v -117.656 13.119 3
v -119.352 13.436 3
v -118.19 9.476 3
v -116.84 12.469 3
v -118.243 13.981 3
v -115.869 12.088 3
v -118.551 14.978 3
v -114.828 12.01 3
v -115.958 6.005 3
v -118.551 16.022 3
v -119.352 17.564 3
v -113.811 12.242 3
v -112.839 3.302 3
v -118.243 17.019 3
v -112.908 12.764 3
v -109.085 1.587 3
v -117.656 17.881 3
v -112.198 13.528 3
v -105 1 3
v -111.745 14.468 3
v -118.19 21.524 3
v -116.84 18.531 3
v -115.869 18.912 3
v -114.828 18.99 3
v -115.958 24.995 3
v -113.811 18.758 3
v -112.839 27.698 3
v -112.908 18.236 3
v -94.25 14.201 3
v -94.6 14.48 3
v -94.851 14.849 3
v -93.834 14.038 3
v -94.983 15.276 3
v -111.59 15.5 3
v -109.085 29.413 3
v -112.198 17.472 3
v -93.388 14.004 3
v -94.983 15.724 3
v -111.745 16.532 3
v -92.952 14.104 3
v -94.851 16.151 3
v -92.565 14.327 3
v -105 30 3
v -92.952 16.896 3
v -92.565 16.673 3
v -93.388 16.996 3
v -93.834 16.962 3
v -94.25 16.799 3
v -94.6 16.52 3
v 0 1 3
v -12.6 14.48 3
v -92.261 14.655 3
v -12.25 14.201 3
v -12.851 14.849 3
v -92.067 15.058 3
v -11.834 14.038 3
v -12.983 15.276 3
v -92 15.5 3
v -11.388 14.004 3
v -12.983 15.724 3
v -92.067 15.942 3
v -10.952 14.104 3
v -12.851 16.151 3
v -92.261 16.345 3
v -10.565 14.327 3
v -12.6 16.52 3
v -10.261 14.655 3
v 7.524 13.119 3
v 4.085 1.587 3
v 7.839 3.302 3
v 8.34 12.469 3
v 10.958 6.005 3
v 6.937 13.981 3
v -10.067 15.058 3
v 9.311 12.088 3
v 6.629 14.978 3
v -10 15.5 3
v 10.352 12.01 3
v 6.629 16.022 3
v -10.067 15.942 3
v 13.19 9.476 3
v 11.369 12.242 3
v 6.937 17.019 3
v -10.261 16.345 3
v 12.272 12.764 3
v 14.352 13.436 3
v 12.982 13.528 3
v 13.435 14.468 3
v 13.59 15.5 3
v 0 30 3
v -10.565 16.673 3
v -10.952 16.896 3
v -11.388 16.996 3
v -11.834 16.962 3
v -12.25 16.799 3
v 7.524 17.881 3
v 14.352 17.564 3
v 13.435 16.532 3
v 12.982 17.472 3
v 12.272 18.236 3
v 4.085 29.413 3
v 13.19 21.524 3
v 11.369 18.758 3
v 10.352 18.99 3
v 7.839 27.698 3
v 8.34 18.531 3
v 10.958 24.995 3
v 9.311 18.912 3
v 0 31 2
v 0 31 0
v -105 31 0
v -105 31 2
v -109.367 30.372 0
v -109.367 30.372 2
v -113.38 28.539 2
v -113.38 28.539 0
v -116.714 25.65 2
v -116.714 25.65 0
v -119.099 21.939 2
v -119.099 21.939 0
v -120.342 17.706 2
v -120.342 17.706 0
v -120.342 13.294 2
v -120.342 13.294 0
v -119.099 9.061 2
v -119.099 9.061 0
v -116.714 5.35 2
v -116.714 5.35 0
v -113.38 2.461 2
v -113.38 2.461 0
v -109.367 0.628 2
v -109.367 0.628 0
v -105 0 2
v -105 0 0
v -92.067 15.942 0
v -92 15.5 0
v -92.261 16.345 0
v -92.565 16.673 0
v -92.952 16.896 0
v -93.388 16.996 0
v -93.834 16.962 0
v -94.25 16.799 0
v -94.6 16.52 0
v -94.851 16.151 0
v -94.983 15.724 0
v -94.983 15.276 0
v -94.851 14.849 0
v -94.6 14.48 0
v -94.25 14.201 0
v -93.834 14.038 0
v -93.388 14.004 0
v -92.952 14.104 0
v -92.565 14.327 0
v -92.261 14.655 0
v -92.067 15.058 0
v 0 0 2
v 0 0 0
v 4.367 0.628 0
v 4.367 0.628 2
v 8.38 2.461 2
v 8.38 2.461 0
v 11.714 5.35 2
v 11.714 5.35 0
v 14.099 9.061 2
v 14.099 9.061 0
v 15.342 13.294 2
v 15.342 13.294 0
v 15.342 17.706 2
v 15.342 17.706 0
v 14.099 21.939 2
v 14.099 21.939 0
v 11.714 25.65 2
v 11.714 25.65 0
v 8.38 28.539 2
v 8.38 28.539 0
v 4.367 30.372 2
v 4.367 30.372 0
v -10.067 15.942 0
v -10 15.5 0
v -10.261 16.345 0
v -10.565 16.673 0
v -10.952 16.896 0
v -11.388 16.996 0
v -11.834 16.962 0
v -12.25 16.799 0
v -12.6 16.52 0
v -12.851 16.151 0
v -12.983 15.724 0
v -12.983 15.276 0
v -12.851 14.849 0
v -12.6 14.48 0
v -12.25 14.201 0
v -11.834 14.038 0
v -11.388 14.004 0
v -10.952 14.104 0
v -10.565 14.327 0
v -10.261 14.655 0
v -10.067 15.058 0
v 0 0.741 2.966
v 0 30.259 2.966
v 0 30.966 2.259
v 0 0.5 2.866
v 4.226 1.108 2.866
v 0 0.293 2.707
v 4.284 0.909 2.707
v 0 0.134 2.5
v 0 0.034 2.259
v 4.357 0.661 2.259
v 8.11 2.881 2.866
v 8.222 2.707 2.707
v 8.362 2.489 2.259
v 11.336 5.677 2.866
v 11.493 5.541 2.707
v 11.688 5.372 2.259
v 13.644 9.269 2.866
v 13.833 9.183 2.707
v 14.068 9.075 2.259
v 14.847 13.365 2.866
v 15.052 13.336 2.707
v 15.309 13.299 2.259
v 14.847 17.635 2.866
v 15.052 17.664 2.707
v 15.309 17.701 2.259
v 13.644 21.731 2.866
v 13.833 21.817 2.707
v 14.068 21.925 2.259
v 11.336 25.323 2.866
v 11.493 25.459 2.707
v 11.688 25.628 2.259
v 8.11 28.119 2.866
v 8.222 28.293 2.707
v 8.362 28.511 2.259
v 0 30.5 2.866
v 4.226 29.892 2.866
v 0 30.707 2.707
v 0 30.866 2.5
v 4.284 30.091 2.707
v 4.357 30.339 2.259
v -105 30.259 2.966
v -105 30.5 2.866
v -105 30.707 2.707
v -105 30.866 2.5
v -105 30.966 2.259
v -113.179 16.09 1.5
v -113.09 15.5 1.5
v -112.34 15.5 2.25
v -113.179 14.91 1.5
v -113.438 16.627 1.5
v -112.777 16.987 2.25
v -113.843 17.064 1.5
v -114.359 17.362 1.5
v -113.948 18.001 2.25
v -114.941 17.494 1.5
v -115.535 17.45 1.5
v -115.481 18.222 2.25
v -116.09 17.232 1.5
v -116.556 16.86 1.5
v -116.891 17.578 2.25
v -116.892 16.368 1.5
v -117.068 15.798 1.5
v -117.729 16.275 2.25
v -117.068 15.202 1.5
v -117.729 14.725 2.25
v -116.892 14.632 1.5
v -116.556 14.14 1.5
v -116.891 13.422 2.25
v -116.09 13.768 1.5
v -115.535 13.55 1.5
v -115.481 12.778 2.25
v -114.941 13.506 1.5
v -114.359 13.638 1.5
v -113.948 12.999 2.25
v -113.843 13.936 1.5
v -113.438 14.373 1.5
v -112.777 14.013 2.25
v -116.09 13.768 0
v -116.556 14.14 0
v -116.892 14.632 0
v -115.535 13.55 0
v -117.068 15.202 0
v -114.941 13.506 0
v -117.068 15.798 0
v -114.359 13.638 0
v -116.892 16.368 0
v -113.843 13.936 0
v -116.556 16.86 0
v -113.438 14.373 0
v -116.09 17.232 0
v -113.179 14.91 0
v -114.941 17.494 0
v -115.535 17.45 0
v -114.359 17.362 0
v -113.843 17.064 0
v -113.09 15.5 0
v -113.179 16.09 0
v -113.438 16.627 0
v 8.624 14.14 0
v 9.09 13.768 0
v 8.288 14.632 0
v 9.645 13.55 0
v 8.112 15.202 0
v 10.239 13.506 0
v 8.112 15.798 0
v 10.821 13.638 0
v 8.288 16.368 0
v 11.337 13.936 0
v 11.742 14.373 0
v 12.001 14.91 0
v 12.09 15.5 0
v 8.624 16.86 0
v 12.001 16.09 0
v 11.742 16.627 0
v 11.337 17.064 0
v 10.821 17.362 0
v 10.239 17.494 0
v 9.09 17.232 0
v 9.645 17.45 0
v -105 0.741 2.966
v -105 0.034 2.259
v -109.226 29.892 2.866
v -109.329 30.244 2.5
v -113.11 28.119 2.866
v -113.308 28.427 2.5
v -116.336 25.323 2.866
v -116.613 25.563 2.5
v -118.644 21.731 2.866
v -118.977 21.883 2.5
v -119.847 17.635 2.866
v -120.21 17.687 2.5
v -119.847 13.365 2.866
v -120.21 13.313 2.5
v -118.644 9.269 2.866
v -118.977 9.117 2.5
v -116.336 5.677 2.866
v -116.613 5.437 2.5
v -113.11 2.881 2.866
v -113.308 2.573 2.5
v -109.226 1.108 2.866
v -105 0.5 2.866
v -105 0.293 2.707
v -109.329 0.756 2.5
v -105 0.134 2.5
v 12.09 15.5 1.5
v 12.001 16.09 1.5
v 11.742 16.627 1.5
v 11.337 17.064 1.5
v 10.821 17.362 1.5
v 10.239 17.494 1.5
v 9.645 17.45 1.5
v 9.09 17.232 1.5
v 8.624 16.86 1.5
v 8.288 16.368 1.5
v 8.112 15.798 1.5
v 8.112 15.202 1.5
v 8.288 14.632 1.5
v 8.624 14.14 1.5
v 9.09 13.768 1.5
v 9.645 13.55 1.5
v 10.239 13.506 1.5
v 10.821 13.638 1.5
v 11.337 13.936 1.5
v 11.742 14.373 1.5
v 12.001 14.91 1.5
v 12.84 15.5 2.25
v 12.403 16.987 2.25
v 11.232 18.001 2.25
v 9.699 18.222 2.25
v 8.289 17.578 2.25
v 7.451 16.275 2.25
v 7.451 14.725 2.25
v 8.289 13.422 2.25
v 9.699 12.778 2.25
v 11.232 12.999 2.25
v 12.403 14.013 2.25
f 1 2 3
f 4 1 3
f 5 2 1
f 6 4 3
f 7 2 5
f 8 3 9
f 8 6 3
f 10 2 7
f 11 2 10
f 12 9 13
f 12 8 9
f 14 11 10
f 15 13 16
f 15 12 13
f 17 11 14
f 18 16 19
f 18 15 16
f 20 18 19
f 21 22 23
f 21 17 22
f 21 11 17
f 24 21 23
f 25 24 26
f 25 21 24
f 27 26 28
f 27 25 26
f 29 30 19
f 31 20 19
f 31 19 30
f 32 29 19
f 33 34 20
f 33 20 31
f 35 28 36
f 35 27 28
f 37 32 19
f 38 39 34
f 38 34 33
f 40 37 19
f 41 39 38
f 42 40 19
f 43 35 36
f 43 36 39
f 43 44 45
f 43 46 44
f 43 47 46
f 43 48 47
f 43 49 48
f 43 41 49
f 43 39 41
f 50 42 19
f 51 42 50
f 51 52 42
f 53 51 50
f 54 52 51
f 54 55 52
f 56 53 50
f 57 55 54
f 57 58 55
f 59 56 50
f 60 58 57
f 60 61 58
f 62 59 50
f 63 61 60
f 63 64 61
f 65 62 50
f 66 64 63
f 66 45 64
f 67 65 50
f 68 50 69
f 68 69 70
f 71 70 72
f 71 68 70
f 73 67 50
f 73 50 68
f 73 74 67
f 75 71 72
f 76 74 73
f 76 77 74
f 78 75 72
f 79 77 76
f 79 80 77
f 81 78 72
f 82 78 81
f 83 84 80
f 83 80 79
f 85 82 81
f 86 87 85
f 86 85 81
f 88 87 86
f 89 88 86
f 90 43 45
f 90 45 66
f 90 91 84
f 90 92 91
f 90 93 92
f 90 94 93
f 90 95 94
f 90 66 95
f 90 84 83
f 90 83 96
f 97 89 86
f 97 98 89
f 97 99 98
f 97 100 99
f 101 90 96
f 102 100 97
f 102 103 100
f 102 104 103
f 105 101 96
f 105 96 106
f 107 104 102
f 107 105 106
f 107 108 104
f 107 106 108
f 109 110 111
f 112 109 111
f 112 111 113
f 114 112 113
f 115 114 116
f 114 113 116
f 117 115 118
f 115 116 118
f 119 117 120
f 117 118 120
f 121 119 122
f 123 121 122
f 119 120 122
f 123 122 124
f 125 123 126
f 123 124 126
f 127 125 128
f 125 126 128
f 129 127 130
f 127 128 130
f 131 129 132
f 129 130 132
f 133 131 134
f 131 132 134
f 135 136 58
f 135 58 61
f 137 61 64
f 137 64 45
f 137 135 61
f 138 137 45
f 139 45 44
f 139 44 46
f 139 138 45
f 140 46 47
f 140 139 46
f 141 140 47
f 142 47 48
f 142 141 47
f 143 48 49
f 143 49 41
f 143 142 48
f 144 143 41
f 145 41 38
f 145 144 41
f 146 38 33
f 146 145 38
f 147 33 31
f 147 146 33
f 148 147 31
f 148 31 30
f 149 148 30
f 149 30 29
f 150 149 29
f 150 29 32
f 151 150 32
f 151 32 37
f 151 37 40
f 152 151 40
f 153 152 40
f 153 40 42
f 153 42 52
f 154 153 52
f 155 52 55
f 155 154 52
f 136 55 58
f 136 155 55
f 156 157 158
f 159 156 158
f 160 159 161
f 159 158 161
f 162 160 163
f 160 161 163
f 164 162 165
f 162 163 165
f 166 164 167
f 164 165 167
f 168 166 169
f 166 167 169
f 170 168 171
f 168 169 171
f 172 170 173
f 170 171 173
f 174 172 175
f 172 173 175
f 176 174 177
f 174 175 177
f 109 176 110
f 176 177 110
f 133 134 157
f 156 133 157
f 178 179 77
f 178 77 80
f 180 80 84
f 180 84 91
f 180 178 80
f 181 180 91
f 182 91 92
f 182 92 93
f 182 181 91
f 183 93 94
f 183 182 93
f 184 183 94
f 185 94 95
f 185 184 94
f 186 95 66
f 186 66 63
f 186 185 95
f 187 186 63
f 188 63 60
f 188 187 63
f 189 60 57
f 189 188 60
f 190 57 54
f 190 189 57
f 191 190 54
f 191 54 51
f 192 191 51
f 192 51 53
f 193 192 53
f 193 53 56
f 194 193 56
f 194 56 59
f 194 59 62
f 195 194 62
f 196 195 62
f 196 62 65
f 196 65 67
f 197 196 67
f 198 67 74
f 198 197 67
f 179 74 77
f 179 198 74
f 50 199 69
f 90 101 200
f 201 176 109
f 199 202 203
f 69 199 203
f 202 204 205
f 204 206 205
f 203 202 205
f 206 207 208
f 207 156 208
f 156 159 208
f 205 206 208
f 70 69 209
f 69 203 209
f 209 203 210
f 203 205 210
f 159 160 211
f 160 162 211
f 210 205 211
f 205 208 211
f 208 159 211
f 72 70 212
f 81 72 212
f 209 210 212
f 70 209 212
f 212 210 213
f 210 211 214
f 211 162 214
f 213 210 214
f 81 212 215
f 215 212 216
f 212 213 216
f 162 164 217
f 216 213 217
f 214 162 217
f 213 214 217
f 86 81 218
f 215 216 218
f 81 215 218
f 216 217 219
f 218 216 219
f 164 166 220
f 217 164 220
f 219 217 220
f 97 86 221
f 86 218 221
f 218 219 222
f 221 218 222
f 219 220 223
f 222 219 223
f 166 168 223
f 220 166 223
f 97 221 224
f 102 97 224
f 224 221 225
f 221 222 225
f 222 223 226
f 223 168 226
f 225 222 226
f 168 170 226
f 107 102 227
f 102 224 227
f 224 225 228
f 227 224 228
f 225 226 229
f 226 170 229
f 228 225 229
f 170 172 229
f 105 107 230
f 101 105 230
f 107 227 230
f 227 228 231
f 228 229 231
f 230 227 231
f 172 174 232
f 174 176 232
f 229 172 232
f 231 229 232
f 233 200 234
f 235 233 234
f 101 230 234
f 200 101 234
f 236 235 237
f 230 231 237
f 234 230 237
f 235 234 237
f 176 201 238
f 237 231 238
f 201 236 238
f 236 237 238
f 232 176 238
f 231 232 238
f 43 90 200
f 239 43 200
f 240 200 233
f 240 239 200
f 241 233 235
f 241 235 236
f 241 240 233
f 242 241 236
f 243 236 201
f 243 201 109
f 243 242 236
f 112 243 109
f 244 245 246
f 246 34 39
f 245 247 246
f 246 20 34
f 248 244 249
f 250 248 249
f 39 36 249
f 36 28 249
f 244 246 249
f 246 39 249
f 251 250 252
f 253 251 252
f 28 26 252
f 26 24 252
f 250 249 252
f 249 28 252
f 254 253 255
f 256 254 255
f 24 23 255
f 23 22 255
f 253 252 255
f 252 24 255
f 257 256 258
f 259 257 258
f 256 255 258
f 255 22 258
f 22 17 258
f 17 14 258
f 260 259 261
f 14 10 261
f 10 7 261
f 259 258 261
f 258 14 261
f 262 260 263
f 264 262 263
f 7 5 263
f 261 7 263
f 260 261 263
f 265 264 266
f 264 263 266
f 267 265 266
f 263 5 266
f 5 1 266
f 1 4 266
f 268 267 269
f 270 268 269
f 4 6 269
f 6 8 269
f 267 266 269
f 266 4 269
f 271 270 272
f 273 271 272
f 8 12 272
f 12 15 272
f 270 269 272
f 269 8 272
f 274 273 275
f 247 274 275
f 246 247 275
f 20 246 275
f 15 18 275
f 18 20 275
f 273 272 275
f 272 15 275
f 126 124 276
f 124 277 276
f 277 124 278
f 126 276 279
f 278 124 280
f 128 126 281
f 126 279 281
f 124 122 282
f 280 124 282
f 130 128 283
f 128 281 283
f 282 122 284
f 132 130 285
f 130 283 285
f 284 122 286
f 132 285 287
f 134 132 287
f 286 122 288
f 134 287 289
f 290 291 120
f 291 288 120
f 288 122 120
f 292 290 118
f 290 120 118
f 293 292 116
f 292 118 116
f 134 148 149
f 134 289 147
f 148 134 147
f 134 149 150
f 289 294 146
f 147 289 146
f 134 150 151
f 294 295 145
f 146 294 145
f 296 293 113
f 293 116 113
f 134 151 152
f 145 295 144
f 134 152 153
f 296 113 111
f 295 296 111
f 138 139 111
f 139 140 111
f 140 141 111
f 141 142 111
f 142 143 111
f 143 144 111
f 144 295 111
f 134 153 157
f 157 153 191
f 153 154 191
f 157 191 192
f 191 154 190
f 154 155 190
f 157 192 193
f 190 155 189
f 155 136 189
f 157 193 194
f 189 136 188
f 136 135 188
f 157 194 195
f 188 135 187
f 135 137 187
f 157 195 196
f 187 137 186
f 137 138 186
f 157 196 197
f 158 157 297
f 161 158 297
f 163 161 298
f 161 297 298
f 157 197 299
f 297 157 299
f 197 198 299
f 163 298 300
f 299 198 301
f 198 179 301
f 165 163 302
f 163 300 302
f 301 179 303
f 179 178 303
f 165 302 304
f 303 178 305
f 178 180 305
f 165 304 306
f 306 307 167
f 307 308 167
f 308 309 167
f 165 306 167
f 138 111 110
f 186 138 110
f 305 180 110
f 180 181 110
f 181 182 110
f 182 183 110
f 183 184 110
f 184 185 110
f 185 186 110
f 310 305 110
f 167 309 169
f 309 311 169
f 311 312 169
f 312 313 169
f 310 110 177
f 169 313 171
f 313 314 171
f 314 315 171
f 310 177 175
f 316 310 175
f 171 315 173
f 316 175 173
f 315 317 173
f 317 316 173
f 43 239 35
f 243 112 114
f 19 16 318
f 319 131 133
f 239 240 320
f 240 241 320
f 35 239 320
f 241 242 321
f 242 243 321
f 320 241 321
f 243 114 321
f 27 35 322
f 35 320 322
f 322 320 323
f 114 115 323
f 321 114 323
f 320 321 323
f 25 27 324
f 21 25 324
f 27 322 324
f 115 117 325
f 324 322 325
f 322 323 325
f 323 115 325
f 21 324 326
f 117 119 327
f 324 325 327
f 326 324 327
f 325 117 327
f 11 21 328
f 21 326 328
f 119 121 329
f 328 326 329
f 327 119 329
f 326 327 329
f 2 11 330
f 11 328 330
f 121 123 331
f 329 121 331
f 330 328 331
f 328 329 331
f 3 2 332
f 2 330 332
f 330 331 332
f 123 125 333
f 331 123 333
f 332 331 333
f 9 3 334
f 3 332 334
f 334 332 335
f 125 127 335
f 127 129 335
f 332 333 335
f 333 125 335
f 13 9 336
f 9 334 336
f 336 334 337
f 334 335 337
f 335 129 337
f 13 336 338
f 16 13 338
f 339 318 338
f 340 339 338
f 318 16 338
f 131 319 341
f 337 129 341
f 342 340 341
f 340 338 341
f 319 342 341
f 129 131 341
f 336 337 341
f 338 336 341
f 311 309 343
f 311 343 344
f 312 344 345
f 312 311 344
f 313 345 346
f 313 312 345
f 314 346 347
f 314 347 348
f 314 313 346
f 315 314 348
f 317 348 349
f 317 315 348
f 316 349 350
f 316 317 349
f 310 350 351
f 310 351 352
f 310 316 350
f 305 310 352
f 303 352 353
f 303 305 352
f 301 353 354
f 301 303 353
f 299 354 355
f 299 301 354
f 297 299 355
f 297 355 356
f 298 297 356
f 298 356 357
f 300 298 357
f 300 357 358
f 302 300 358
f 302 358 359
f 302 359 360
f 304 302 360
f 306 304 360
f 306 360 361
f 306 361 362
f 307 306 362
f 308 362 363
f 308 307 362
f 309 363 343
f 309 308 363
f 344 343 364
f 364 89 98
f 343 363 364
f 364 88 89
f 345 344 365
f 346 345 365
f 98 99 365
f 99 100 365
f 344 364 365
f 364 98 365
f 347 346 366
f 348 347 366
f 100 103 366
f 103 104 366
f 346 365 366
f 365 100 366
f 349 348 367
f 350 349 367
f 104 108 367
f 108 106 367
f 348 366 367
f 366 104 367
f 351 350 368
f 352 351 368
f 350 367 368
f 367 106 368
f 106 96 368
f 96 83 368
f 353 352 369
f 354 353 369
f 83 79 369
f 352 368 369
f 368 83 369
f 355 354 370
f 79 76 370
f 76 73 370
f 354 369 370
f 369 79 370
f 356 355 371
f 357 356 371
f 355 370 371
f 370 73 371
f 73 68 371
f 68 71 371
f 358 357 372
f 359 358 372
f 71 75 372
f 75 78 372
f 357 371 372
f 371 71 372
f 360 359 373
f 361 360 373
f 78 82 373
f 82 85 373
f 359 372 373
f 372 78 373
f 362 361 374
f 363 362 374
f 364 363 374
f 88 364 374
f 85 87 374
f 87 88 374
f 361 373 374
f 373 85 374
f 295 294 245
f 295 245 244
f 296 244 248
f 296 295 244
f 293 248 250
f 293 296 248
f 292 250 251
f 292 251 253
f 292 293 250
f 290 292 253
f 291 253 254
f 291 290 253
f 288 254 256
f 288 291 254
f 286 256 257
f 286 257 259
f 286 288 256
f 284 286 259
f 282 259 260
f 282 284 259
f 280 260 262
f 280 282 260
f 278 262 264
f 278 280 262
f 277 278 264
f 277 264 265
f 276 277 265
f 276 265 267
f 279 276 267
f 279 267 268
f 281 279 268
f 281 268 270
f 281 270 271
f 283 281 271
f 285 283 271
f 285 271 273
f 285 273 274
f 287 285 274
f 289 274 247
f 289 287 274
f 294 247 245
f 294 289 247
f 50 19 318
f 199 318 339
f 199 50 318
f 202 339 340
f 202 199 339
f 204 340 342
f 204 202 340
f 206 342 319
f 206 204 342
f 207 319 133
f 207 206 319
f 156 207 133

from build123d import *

# Parameters (mm, degrees)
F0_R     = 2
F0_R_2   = 1.5
F1_DEPTH = 3
F2_SIZE  = 1.5
F3_R     = 1


with BuildPart() as f1:
    # F0 (on Top) → F1 (new body)
    with BuildSketch(Plane.XY):
        with BuildLine():
            Line((-105, 0), (0, 0))
            ThreePointArc((0, 0), (15.5, 15.5), (0, 31))
            Line((0, 31), (-105, 31))
            ThreePointArc((-105, 31), (-120.5, 15.5), (-105, 0))
        make_face()
        with Locations((-115.09, 15.5)):
            Circle(F0_R, mode=Mode.SUBTRACT)
        with Locations((-93.5, 15.5)):
            Circle(F0_R_2, mode=Mode.SUBTRACT)
        with Locations((-11.5, 15.5)):
            Circle(F0_R_2, mode=Mode.SUBTRACT)
        with Locations((10.09, 15.5)):
            Circle(F0_R, mode=Mode.SUBTRACT)
    extrude(amount=F1_DEPTH)

    # F2
    f2_edges = [f1.edges().sort_by_distance(p)[0] for p in [
        (-117.09, 15.5, 3),
        (8.09, 15.5, 3),
    ]]
    chamfer(f2_edges, length=F2_SIZE)

    # F3
    f3_edges = [f1.edges().sort_by_distance(p)[0] for p in [
        (-120.5, 15.5, 3),
        (-52.5, 0, 3),
        (-52.5, 31, 3),
        (15.5, 15.5, 3),
    ]]
    fillet(f3_edges, radius=F3_R)


solid = f1.part
